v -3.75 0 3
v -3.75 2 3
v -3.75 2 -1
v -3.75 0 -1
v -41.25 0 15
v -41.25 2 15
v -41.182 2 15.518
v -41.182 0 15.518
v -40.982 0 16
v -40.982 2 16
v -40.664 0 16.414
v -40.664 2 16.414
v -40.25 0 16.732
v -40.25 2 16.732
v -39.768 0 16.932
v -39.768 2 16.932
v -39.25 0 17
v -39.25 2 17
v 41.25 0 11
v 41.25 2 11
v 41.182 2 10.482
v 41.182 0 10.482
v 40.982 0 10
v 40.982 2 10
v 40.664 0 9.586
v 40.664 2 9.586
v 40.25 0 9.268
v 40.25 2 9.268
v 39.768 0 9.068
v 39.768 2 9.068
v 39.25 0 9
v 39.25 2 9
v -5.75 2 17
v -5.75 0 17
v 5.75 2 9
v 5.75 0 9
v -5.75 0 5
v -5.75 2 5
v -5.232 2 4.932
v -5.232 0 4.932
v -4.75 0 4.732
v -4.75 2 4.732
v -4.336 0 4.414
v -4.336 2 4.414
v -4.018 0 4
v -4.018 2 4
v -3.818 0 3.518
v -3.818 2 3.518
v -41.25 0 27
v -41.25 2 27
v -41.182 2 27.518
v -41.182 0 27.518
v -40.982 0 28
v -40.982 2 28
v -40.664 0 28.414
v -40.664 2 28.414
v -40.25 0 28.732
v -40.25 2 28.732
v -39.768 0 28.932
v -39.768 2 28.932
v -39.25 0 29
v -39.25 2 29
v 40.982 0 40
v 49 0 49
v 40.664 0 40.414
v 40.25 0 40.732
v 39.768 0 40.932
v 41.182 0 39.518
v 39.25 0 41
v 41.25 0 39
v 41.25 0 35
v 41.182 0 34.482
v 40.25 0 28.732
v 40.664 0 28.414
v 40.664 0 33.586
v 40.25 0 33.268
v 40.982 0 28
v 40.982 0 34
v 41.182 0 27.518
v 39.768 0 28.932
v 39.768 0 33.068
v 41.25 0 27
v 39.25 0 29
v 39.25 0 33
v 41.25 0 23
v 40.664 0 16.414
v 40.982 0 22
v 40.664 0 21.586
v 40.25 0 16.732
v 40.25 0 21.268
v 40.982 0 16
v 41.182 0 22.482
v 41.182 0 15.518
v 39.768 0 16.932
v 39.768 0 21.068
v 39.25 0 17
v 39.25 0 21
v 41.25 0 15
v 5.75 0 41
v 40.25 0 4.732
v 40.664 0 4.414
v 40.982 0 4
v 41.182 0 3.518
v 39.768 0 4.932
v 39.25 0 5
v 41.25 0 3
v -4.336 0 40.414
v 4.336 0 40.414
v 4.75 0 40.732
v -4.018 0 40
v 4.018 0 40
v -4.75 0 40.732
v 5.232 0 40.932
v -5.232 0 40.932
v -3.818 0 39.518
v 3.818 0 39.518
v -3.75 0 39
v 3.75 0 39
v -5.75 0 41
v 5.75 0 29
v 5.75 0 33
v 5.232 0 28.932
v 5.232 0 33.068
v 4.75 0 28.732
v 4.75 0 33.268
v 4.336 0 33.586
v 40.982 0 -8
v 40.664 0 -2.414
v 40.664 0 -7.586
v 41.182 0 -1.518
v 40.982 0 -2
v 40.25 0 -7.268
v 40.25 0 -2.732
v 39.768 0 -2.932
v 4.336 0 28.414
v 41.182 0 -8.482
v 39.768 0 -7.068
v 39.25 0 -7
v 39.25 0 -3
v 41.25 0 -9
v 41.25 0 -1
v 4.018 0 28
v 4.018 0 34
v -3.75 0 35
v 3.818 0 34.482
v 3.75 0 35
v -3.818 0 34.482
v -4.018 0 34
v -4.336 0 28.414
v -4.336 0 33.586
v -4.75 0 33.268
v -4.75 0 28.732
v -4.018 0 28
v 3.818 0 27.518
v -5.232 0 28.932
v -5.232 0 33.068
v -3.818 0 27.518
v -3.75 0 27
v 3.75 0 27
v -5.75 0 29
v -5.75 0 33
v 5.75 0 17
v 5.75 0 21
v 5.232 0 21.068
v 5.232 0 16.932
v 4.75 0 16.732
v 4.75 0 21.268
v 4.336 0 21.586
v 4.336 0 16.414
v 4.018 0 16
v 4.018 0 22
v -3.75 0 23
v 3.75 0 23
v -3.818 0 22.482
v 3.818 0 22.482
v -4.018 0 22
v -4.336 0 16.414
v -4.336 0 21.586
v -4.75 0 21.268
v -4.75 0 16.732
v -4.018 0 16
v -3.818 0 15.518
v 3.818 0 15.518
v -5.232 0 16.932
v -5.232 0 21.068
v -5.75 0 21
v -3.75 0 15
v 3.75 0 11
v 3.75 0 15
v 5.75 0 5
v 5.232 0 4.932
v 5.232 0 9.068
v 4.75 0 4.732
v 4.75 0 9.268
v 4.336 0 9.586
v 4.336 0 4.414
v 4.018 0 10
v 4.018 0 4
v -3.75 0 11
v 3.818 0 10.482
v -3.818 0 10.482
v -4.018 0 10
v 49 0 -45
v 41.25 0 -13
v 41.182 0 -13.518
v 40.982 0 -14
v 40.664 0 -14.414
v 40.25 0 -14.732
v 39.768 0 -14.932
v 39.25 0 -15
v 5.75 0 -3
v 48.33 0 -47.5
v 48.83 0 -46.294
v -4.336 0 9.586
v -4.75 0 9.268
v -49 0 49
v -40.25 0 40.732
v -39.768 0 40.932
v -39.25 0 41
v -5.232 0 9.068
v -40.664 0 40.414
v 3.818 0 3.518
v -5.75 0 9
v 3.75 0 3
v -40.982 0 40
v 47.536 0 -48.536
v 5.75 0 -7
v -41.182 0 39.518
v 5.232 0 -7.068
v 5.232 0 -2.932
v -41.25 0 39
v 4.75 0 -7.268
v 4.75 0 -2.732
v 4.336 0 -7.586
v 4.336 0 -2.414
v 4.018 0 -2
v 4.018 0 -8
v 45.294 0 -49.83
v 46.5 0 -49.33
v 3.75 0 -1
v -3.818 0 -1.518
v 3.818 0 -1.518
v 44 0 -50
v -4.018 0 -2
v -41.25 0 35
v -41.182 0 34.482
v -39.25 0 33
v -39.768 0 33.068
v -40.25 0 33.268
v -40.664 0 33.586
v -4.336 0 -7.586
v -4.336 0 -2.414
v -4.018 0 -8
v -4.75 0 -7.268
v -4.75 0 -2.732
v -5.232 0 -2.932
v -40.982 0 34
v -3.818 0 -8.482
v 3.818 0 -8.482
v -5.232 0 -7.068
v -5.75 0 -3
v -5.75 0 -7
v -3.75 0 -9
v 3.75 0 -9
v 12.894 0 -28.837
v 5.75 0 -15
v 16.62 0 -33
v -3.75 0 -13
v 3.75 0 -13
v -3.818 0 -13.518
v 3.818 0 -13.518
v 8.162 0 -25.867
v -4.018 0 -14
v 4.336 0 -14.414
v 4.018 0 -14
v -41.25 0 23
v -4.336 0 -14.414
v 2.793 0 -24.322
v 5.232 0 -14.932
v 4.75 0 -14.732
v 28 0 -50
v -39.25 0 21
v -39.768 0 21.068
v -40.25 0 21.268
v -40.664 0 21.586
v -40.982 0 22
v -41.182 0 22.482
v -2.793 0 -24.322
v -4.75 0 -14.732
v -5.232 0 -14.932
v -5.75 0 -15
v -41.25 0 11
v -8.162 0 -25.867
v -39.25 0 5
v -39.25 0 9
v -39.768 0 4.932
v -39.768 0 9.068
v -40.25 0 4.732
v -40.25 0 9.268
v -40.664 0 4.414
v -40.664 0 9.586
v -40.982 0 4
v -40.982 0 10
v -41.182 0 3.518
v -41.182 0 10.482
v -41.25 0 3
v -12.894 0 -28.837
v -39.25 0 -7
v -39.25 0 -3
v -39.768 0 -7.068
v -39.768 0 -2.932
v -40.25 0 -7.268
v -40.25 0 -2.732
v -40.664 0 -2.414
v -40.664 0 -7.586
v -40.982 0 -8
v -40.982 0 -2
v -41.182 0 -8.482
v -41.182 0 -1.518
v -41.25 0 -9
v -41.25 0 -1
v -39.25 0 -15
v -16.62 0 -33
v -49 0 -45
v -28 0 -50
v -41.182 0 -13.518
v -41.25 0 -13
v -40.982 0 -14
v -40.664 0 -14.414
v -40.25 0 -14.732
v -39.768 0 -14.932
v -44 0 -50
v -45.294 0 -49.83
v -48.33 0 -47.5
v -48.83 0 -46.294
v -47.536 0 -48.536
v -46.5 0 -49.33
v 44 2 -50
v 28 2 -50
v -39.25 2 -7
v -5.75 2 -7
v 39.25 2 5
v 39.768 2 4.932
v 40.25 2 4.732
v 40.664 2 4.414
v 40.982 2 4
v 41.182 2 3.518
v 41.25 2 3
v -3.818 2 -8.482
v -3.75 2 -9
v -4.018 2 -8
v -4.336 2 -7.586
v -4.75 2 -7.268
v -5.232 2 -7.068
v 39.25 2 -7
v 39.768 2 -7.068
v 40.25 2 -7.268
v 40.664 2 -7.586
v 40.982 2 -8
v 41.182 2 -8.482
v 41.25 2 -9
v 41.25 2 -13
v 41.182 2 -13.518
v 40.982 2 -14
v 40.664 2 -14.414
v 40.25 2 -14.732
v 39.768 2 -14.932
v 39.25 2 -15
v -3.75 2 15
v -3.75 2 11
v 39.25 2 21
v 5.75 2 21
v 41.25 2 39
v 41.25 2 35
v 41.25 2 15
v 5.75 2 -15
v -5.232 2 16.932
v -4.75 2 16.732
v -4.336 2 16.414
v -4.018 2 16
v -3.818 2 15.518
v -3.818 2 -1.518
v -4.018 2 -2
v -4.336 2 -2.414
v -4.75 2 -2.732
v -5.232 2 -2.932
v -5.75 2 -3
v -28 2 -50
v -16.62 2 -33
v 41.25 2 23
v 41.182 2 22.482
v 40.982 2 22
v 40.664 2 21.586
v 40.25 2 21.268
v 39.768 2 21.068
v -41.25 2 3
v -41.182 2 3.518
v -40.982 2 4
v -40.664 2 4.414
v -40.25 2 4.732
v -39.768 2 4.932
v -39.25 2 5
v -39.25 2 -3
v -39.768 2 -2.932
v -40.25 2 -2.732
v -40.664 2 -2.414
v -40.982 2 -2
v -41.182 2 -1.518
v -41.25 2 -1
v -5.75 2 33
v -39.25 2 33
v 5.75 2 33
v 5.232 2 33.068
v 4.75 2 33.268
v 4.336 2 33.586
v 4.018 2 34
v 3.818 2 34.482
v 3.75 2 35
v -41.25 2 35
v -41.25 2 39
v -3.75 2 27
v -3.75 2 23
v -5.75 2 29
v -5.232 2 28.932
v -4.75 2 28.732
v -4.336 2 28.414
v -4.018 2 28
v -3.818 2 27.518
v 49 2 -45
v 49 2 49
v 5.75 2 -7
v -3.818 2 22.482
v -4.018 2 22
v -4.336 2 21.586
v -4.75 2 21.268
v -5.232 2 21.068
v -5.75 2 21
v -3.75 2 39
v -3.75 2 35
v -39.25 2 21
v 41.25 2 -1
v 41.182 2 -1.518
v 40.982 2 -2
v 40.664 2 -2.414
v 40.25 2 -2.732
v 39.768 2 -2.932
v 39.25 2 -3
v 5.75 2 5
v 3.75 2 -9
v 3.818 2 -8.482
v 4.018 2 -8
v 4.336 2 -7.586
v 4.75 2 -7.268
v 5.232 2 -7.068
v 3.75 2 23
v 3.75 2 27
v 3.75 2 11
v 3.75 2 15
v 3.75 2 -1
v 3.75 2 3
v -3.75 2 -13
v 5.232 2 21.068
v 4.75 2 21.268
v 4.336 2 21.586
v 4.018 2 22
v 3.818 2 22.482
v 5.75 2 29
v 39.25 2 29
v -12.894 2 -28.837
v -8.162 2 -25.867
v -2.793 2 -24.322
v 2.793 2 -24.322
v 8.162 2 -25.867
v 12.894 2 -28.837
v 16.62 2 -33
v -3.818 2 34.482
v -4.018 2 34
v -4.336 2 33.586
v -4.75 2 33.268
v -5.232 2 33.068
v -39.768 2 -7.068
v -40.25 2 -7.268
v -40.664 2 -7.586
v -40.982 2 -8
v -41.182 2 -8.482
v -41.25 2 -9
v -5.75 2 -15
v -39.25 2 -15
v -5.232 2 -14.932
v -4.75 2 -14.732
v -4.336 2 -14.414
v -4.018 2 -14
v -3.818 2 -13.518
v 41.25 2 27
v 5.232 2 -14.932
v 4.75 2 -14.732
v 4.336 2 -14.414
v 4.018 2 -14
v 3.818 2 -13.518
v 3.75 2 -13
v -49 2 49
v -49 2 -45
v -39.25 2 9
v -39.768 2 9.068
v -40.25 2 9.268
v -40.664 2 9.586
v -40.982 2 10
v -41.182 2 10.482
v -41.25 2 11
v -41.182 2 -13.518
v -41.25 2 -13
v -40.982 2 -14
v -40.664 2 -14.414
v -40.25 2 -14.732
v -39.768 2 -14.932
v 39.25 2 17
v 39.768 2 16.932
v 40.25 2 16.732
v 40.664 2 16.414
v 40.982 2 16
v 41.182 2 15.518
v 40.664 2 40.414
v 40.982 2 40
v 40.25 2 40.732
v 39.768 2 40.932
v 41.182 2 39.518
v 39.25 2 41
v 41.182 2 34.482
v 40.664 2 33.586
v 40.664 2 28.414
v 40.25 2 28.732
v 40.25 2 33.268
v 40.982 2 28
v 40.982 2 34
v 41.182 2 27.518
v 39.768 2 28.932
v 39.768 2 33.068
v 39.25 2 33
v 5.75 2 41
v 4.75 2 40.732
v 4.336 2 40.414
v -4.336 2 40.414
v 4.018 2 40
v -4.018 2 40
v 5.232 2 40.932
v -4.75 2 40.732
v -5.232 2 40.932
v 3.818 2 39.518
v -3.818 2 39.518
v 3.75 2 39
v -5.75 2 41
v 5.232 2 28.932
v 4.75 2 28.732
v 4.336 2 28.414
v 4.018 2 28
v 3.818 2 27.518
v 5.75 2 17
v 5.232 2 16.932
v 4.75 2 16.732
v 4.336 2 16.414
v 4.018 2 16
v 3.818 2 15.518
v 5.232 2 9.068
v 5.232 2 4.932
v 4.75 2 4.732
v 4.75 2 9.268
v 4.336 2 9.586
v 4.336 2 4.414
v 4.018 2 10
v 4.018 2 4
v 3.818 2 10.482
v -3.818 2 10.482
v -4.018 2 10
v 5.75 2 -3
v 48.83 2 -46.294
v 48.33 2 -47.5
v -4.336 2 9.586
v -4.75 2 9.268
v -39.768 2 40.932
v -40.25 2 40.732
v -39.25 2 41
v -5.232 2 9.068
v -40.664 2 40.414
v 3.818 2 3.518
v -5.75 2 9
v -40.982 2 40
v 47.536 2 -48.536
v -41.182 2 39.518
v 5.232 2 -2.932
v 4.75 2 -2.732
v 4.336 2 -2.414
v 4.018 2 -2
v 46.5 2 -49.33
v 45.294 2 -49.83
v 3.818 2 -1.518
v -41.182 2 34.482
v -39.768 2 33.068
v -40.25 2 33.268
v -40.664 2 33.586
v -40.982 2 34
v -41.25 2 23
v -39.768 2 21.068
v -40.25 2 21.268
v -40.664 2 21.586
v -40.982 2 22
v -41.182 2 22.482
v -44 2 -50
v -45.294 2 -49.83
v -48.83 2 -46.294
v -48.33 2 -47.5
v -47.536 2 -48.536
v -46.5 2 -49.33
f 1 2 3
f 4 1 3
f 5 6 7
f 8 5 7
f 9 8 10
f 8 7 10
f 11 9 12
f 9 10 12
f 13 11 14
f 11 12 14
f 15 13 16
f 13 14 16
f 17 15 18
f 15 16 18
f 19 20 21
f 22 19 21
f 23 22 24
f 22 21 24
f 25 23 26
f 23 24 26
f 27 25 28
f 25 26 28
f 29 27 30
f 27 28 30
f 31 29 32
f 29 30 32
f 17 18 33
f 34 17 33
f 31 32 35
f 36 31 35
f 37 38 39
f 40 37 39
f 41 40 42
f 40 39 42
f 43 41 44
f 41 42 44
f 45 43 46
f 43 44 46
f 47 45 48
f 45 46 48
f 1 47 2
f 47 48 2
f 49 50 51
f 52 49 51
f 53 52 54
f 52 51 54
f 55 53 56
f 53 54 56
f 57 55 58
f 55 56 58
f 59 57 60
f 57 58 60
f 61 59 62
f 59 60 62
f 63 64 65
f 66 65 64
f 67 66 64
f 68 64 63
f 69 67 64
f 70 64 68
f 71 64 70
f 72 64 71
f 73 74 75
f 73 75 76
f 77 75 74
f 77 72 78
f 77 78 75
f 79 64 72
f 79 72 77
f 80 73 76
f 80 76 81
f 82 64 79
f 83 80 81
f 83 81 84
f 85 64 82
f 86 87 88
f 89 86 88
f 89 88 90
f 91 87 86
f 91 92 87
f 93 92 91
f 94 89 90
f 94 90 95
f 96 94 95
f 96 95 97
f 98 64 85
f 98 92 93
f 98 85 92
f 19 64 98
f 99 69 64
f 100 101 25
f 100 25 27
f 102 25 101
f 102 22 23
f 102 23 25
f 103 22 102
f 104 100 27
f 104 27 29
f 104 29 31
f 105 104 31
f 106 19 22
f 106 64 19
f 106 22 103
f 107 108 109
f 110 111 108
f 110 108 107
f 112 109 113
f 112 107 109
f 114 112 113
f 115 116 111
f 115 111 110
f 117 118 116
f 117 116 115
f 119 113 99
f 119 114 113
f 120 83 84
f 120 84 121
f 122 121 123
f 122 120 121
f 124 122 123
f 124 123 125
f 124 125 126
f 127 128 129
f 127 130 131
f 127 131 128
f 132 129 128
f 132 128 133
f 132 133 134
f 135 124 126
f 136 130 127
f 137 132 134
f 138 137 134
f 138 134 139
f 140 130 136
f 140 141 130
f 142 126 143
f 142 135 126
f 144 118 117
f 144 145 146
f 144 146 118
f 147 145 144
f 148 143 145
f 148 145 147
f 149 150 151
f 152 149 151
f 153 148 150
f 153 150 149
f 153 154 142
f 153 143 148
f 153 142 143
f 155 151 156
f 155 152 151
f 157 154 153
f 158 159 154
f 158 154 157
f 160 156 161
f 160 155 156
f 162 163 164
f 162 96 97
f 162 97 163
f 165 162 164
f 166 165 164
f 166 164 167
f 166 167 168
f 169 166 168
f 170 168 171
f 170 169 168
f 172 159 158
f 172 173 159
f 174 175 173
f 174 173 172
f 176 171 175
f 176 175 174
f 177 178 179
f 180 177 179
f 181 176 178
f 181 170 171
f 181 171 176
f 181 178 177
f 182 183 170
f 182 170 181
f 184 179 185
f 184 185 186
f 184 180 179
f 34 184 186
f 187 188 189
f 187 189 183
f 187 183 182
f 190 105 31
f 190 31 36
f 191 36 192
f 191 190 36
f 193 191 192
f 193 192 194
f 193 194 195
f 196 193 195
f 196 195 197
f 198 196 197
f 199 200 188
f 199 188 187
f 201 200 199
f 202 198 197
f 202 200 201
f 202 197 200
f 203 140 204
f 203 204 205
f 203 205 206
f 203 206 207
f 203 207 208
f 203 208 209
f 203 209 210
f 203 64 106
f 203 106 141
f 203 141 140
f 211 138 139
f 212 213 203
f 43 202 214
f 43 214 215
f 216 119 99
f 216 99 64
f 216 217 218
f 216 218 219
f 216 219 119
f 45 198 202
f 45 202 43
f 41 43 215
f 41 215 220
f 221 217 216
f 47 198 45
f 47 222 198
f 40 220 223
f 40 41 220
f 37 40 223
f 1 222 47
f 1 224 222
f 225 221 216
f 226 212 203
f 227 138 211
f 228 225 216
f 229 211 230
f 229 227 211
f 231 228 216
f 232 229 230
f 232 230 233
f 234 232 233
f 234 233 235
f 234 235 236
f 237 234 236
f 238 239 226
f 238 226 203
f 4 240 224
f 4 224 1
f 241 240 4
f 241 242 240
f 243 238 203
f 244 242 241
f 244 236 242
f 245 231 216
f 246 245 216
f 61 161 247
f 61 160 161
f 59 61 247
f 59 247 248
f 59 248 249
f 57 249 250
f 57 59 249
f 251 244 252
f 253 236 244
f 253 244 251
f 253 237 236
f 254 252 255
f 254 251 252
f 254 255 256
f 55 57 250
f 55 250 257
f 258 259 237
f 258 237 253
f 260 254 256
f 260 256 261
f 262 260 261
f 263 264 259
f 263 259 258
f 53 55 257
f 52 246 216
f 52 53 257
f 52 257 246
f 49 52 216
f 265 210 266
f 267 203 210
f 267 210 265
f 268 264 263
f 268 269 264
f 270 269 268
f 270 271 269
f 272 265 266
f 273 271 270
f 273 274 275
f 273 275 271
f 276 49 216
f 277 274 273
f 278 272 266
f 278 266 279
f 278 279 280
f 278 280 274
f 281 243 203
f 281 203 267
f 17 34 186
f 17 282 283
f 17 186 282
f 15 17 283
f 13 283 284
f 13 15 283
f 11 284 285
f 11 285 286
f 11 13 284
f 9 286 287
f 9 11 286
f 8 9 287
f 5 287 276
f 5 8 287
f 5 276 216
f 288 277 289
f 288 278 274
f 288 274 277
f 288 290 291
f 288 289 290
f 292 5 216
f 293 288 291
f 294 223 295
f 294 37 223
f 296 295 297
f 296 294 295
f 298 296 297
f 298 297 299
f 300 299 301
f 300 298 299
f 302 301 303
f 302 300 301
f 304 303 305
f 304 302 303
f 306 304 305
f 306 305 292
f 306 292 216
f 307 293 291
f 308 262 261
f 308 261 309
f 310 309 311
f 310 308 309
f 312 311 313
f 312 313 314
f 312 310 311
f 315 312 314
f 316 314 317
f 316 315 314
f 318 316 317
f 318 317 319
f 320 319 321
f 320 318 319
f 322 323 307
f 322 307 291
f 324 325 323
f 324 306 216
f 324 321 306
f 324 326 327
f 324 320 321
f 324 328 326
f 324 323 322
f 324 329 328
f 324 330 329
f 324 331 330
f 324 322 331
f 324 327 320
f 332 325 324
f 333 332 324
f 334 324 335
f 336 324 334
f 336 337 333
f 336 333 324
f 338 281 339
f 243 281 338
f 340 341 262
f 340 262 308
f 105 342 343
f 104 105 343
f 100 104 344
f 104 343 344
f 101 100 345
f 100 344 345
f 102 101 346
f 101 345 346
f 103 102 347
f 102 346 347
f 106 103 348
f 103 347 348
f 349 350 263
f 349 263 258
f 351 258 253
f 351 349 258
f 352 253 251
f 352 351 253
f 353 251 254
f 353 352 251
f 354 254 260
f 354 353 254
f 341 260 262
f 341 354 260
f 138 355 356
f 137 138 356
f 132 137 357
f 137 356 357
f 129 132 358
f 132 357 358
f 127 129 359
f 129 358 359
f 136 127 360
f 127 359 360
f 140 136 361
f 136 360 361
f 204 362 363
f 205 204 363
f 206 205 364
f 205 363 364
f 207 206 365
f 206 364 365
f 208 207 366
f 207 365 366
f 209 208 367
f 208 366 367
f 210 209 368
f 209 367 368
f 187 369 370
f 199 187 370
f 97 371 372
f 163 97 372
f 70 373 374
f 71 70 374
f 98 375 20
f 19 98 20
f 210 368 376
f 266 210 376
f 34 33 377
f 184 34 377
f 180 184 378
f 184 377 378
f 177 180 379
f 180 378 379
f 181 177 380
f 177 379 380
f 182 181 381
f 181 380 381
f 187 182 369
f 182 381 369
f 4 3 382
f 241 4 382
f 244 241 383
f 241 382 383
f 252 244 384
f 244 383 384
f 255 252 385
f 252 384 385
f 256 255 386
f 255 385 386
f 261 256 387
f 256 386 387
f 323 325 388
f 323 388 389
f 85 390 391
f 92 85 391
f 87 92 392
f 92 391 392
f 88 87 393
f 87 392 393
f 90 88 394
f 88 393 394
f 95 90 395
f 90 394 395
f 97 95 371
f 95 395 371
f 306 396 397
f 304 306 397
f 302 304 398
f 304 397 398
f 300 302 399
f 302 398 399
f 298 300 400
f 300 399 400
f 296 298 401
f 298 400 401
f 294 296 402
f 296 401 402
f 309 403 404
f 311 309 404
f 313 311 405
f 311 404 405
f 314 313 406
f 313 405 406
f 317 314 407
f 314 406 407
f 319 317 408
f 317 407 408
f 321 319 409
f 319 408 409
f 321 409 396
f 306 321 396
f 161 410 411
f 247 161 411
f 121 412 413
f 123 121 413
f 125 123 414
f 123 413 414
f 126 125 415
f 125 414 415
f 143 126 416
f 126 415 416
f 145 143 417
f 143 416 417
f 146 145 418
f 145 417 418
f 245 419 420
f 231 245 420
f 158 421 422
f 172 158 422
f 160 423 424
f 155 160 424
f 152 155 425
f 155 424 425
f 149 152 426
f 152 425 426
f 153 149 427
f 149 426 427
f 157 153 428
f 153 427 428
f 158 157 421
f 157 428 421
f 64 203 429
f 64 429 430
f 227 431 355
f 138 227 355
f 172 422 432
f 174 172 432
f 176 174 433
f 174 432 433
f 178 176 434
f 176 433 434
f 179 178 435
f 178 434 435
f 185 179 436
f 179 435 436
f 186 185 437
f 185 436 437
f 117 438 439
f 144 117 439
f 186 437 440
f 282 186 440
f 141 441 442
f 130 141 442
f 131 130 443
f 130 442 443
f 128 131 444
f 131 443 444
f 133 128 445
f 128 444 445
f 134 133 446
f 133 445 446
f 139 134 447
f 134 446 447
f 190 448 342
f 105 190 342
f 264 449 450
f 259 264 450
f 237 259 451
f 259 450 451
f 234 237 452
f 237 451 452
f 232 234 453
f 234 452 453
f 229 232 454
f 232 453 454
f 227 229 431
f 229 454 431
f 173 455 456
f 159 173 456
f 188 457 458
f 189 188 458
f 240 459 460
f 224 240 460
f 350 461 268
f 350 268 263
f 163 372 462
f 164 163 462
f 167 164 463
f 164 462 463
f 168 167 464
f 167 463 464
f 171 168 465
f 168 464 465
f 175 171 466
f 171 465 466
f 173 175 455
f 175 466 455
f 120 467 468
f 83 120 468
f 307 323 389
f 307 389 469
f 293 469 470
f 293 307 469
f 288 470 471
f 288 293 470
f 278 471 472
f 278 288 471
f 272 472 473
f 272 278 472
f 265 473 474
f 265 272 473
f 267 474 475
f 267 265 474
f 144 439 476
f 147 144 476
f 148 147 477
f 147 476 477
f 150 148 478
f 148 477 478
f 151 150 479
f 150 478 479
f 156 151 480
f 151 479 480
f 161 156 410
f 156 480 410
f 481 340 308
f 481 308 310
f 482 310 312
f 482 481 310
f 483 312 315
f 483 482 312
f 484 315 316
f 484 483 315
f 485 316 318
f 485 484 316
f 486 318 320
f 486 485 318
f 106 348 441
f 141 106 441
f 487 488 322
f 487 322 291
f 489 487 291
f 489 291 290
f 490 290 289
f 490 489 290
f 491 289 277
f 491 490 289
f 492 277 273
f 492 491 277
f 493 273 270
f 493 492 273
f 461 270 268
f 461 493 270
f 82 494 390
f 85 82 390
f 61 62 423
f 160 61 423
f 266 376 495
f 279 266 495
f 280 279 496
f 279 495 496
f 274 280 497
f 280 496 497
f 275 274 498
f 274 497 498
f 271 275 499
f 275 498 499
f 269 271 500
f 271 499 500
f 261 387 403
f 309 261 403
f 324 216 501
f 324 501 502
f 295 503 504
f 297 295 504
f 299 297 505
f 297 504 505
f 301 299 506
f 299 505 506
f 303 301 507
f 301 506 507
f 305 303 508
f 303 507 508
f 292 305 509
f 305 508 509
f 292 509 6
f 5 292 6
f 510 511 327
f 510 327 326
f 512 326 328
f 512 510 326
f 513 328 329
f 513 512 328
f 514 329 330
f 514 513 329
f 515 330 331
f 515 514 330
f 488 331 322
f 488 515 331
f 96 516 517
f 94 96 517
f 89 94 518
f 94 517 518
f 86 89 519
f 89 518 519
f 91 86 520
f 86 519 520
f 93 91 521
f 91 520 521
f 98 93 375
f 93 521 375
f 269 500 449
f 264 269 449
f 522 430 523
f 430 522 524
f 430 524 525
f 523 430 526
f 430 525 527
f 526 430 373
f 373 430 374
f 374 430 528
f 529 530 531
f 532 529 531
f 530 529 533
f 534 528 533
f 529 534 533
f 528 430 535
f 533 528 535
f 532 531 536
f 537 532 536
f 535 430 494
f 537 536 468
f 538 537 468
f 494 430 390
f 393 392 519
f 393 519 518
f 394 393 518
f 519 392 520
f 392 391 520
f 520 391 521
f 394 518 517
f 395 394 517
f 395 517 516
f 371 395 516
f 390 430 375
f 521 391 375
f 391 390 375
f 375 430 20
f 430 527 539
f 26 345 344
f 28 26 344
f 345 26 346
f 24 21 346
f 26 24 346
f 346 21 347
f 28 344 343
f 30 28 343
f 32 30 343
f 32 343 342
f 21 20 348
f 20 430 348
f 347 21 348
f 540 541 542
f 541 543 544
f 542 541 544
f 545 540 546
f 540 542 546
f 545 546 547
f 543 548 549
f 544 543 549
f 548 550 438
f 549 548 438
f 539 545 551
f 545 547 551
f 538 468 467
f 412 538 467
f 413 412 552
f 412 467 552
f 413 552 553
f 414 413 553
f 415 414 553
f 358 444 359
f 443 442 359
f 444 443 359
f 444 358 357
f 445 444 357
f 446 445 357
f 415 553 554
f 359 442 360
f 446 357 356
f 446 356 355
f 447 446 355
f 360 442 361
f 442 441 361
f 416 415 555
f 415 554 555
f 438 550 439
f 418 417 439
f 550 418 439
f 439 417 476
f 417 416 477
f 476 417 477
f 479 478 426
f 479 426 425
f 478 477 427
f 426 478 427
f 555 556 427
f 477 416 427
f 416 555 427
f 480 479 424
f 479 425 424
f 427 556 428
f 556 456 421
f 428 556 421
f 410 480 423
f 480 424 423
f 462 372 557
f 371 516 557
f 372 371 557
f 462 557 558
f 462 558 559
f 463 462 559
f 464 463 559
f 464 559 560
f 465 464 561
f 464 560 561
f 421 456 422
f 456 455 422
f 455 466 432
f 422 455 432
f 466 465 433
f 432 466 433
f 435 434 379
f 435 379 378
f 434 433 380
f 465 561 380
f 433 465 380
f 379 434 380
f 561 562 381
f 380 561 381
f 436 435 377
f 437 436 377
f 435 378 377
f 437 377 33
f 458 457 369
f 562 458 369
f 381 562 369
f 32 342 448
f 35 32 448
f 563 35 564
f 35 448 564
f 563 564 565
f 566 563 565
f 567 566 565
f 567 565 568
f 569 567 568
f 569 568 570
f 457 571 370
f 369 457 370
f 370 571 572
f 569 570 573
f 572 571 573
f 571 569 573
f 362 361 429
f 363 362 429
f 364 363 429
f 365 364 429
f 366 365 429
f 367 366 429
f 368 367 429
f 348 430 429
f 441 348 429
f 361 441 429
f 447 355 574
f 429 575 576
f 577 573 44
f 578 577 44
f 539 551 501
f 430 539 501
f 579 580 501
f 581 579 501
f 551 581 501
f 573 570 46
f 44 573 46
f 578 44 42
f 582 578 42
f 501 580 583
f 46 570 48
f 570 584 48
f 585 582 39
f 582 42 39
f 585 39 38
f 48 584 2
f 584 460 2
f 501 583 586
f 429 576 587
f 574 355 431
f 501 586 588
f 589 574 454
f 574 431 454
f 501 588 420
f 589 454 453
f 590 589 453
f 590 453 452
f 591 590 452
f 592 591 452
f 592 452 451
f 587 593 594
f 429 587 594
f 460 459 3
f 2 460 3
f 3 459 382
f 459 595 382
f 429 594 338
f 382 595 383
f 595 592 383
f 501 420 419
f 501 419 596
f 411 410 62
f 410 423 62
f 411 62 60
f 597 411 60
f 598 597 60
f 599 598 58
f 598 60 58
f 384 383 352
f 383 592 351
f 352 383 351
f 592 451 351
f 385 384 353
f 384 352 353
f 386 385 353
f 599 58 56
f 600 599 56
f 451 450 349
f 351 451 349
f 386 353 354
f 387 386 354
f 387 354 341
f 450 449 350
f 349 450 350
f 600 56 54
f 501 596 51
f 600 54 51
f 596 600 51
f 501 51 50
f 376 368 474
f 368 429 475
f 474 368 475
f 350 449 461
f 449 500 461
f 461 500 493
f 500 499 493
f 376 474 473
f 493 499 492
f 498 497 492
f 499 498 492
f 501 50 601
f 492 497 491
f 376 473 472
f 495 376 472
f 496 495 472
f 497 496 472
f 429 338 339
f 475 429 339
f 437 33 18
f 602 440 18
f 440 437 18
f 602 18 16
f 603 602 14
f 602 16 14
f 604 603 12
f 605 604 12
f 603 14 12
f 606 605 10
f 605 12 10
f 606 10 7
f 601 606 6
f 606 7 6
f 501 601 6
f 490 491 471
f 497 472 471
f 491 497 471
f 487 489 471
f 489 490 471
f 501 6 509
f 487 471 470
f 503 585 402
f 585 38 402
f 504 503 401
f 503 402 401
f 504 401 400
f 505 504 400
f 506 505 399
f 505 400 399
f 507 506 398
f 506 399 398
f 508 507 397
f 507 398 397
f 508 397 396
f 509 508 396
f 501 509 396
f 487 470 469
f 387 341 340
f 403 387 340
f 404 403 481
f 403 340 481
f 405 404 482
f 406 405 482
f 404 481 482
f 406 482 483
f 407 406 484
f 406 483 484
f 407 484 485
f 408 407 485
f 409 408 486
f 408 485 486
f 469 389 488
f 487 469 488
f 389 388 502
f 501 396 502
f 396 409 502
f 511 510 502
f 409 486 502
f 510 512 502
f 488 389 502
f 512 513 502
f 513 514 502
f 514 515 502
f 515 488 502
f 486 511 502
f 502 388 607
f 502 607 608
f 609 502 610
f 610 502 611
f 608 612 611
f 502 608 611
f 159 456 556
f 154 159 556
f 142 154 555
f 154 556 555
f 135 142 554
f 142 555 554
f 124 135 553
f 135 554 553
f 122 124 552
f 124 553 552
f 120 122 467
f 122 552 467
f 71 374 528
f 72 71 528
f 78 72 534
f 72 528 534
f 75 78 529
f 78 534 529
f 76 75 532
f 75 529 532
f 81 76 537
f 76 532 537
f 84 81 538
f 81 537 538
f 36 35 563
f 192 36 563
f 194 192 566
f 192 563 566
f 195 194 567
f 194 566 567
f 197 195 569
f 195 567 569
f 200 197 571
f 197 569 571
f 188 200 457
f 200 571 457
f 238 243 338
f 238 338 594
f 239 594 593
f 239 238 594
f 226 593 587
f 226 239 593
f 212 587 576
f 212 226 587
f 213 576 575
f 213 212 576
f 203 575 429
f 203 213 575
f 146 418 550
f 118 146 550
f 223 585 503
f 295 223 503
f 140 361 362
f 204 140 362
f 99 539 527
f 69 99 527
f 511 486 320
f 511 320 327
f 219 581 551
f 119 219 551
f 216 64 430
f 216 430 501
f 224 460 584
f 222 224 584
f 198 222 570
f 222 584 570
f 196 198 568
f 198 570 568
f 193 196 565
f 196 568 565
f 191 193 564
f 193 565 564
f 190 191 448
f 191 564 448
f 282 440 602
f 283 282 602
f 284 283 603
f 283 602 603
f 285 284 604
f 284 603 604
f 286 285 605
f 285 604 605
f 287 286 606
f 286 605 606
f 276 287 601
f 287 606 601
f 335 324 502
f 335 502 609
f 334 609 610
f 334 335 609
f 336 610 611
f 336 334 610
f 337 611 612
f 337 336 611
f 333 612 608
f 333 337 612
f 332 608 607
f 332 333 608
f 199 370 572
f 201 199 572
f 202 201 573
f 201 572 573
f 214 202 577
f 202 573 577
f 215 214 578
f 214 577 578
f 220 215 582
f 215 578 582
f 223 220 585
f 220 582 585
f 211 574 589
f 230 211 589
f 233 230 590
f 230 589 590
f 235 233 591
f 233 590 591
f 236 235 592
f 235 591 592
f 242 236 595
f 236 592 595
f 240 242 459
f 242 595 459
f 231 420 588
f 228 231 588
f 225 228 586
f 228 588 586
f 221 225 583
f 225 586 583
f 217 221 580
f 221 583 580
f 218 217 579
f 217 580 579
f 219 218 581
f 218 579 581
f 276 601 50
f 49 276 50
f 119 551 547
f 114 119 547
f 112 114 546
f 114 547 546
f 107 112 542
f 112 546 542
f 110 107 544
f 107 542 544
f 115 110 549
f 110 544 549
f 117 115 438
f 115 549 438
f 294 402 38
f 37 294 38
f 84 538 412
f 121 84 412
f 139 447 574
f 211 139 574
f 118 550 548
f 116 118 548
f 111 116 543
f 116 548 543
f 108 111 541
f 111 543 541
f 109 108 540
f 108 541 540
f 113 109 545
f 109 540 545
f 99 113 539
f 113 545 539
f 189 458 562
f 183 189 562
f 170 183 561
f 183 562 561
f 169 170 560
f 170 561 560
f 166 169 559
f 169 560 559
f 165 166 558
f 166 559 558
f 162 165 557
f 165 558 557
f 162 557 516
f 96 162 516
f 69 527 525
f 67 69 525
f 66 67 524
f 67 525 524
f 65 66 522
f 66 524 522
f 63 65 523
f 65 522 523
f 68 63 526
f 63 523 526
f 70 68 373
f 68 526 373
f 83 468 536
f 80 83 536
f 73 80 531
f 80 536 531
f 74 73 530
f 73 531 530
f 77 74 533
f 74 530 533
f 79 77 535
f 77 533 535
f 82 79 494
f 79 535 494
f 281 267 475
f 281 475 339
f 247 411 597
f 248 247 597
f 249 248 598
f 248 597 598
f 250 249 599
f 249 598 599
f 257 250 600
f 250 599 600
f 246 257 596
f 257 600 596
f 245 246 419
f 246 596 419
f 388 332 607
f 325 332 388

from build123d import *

# Parameters (mm, degrees)
AUFSATZ_LINEAR_AUSTRAGEN2_DEPTH = 2
SCHNITT_LINEAR_AUSTRAGEN2_DEPTH = 2


with BuildPart() as part:
    # Skizze2 → Aufsatz-Linear austragen2 (new body)
    with BuildSketch(Plane(origin=(0, 0, 0), x_dir=(1, 0, 0), z_dir=(0, 1, 0))):
        with BuildLine():
            Line((-44, 50), (-28, 50))
            Line((-28, 50), (-16.61985221, 33))
            ThreePointArc((-16.61985221, 33), (0, 24.125669082), (16.61985221, 33))
            Line((16.61985221, 33), (28, 50))
            Line((28, 50), (44, 50))
            ThreePointArc((44, 50), (47.535533906, 48.535533906), (49, 45))
            Line((49, 45), (49, -49))
            Line((49, -49), (-49, -49))
            Line((-49, -49), (-49, 45))
            ThreePointArc((-49, 45), (-47.535533906, 48.535533906), (-44, 50))
        make_face()
    extrude(amount=AUFSATZ_LINEAR_AUSTRAGEN2_DEPTH)

    # Skizze3 → Schnitt-Linear austragen2 (cut)
    with BuildSketch(Plane(origin=(0, 2, 0), x_dir=(1, 0, 0), z_dir=(0, 1, 0))):
        with BuildLine():
            Line((-39.25, 15), (-5.75, 15))
            ThreePointArc((-5.75, 15), (-4.335786438, 14.414213562), (-3.75, 13))
            Line((-3.75, 13), (-3.75, 9))
            ThreePointArc((-3.75, 9), (-4.335786438, 7.585786438), (-5.75, 7))
            Line((-5.75, 7), (-39.25, 7))
            ThreePointArc((-39.25, 7), (-40.664213562, 7.585786438), (-41.25, 9))
            Line((-41.25, 9), (-41.25, 13))
            ThreePointArc((-41.25, 13), (-40.664213562, 14.414213562), (-39.25, 15))
        make_face()
        with BuildLine():
            Line((3.75, 13), (3.75, 9))
            ThreePointArc((3.75, 9), (4.335786438, 7.585786438), (5.75, 7))
            Line((5.75, 7), (39.25, 7))
            ThreePointArc((39.25, 7), (40.664213562, 7.585786438), (41.25, 9))
            Line((41.25, 9), (41.25, 13))
            ThreePointArc((41.25, 13), (40.664213562, 14.414213562), (39.25, 15))
            Line((39.25, 15), (5.75, 15))
            ThreePointArc((5.75, 15), (4.335786438, 14.414213562), (3.75, 13))
        make_face()
        with BuildLine():
            Line((3.75, 1), (3.75, -3))
            ThreePointArc((3.75, -3), (4.335786438, -4.414213562), (5.75, -5))
            Line((5.75, -5), (39.25, -5))
            ThreePointArc((39.25, -5), (40.664213562, -4.414213562), (41.25, -3))
            Line((41.25, -3), (41.25, 1))
            ThreePointArc((41.25, 1), (40.664213562, 2.414213562), (39.25, 3))
            Line((39.25, 3), (5.75, 3))
            ThreePointArc((5.75, 3), (4.335786438, 2.414213562), (3.75, 1))
        make_face()
        with BuildLine():
            Line((3.75, -11), (3.75, -15))
            ThreePointArc((3.75, -15), (4.335786438, -16.414213562), (5.75, -17))
            Line((5.75, -17), (39.25, -17))
            ThreePointArc((39.25, -17), (40.664213562, -16.414213562), (41.25, -15))
            Line((41.25, -15), (41.25, -11))
            ThreePointArc((41.25, -11), (40.664213562, -9.585786438), (39.25, -9))
            Line((39.25, -9), (5.75, -9))
            ThreePointArc((5.75, -9), (4.335786438, -9.585786438), (3.75, -11))
        make_face()
        with BuildLine():
            Line((3.75, -23), (3.75, -27))
            ThreePointArc((3.75, -27), (4.335786438, -28.414213562), (5.75, -29))
            Line((5.75, -29), (39.25, -29))
            ThreePointArc((39.25, -29), (40.664213562, -28.414213562), (41.25, -27))
            Line((41.25, -27), (41.25, -23))
            ThreePointArc((41.25, -23), (40.664213562, -21.585786438), (39.25, -21))
            Line((39.25, -21), (5.75, -21))
            ThreePointArc((5.75, -21), (4.335786438, -21.585786438), (3.75, -23))
        make_face()
        with BuildLine():
            Line((3.75, -35), (3.75, -39))
            ThreePointArc((3.75, -39), (4.335786438, -40.414213562), (5.75, -41))
            Line((5.75, -41), (39.25, -41))
            ThreePointArc((39.25, -41), (40.664213562, -40.414213562), (41.25, -39))
            Line((41.25, -39), (41.25, -35))
            ThreePointArc((41.25, -35), (40.664213562, -33.585786438), (39.25, -33))
            Line((39.25, -33), (5.75, -33))
            ThreePointArc((5.75, -33), (4.335786438, -33.585786438), (3.75, -35))
        make_face()
        with BuildLine():
            Line((-41.25, 1), (-41.25, -3))
            ThreePointArc((-41.25, -3), (-40.664213562, -4.414213562), (-39.25, -5))
            Line((-39.25, -5), (-5.75, -5))
            ThreePointArc((-5.75, -5), (-4.335786438, -4.414213562), (-3.75, -3))
            Line((-3.75, -3), (-3.75, 1))
            ThreePointArc((-3.75, 1), (-4.335786438, 2.414213562), (-5.75, 3))
            Line((-5.75, 3), (-39.25, 3))
            ThreePointArc((-39.25, 3), (-40.664213562, 2.414213562), (-41.25, 1))
        make_face()
        with BuildLine():
            Line((-41.25, -11), (-41.25, -15))
            ThreePointArc((-41.25, -15), (-40.664213562, -16.414213562), (-39.25, -17))
            Line((-39.25, -17), (-5.75, -17))
            ThreePointArc((-5.75, -17), (-4.335786438, -16.414213562), (-3.75, -15))
            Line((-3.75, -15), (-3.75, -11))
            ThreePointArc((-3.75, -11), (-4.335786438, -9.585786438), (-5.75, -9))
            Line((-5.75, -9), (-39.25, -9))
            ThreePointArc((-39.25, -9), (-40.664213562, -9.585786438), (-41.25, -11))
        make_face()
        with BuildLine():
            Line((-41.25, -23), (-41.25, -27))
            ThreePointArc((-41.25, -27), (-40.664213562, -28.414213562), (-39.25, -29))
            Line((-39.25, -29), (-5.75, -29))
            ThreePointArc((-5.75, -29), (-4.335786438, -28.414213562), (-3.75, -27))
            Line((-3.75, -27), (-3.75, -23))
            ThreePointArc((-3.75, -23), (-4.335786438, -21.585786438), (-5.75, -21))
            Line((-5.75, -21), (-39.25, -21))
            ThreePointArc((-39.25, -21), (-40.664213562, -21.585786438), (-41.25, -23))
        make_face()
        with BuildLine():
            Line((-41.25, -35), (-41.25, -39))
            ThreePointArc((-41.25, -39), (-40.664213562, -40.414213562), (-39.25, -41))
            Line((-39.25, -41), (-5.75, -41))
            ThreePointArc((-5.75, -41), (-4.335786438, -40.414213562), (-3.75, -39))
            Line((-3.75, -39), (-3.75, -35))
            ThreePointArc((-3.75, -35), (-4.335786438, -33.585786438), (-5.75, -33))
            Line((-5.75, -33), (-39.25, -33))
            ThreePointArc((-39.25, -33), (-40.664213562, -33.585786438), (-41.25, -35))
        make_face()
    extrude(amount=-SCHNITT_LINEAR_AUSTRAGEN2_DEPTH, mode=Mode.SUBTRACT)


solid = part.part
